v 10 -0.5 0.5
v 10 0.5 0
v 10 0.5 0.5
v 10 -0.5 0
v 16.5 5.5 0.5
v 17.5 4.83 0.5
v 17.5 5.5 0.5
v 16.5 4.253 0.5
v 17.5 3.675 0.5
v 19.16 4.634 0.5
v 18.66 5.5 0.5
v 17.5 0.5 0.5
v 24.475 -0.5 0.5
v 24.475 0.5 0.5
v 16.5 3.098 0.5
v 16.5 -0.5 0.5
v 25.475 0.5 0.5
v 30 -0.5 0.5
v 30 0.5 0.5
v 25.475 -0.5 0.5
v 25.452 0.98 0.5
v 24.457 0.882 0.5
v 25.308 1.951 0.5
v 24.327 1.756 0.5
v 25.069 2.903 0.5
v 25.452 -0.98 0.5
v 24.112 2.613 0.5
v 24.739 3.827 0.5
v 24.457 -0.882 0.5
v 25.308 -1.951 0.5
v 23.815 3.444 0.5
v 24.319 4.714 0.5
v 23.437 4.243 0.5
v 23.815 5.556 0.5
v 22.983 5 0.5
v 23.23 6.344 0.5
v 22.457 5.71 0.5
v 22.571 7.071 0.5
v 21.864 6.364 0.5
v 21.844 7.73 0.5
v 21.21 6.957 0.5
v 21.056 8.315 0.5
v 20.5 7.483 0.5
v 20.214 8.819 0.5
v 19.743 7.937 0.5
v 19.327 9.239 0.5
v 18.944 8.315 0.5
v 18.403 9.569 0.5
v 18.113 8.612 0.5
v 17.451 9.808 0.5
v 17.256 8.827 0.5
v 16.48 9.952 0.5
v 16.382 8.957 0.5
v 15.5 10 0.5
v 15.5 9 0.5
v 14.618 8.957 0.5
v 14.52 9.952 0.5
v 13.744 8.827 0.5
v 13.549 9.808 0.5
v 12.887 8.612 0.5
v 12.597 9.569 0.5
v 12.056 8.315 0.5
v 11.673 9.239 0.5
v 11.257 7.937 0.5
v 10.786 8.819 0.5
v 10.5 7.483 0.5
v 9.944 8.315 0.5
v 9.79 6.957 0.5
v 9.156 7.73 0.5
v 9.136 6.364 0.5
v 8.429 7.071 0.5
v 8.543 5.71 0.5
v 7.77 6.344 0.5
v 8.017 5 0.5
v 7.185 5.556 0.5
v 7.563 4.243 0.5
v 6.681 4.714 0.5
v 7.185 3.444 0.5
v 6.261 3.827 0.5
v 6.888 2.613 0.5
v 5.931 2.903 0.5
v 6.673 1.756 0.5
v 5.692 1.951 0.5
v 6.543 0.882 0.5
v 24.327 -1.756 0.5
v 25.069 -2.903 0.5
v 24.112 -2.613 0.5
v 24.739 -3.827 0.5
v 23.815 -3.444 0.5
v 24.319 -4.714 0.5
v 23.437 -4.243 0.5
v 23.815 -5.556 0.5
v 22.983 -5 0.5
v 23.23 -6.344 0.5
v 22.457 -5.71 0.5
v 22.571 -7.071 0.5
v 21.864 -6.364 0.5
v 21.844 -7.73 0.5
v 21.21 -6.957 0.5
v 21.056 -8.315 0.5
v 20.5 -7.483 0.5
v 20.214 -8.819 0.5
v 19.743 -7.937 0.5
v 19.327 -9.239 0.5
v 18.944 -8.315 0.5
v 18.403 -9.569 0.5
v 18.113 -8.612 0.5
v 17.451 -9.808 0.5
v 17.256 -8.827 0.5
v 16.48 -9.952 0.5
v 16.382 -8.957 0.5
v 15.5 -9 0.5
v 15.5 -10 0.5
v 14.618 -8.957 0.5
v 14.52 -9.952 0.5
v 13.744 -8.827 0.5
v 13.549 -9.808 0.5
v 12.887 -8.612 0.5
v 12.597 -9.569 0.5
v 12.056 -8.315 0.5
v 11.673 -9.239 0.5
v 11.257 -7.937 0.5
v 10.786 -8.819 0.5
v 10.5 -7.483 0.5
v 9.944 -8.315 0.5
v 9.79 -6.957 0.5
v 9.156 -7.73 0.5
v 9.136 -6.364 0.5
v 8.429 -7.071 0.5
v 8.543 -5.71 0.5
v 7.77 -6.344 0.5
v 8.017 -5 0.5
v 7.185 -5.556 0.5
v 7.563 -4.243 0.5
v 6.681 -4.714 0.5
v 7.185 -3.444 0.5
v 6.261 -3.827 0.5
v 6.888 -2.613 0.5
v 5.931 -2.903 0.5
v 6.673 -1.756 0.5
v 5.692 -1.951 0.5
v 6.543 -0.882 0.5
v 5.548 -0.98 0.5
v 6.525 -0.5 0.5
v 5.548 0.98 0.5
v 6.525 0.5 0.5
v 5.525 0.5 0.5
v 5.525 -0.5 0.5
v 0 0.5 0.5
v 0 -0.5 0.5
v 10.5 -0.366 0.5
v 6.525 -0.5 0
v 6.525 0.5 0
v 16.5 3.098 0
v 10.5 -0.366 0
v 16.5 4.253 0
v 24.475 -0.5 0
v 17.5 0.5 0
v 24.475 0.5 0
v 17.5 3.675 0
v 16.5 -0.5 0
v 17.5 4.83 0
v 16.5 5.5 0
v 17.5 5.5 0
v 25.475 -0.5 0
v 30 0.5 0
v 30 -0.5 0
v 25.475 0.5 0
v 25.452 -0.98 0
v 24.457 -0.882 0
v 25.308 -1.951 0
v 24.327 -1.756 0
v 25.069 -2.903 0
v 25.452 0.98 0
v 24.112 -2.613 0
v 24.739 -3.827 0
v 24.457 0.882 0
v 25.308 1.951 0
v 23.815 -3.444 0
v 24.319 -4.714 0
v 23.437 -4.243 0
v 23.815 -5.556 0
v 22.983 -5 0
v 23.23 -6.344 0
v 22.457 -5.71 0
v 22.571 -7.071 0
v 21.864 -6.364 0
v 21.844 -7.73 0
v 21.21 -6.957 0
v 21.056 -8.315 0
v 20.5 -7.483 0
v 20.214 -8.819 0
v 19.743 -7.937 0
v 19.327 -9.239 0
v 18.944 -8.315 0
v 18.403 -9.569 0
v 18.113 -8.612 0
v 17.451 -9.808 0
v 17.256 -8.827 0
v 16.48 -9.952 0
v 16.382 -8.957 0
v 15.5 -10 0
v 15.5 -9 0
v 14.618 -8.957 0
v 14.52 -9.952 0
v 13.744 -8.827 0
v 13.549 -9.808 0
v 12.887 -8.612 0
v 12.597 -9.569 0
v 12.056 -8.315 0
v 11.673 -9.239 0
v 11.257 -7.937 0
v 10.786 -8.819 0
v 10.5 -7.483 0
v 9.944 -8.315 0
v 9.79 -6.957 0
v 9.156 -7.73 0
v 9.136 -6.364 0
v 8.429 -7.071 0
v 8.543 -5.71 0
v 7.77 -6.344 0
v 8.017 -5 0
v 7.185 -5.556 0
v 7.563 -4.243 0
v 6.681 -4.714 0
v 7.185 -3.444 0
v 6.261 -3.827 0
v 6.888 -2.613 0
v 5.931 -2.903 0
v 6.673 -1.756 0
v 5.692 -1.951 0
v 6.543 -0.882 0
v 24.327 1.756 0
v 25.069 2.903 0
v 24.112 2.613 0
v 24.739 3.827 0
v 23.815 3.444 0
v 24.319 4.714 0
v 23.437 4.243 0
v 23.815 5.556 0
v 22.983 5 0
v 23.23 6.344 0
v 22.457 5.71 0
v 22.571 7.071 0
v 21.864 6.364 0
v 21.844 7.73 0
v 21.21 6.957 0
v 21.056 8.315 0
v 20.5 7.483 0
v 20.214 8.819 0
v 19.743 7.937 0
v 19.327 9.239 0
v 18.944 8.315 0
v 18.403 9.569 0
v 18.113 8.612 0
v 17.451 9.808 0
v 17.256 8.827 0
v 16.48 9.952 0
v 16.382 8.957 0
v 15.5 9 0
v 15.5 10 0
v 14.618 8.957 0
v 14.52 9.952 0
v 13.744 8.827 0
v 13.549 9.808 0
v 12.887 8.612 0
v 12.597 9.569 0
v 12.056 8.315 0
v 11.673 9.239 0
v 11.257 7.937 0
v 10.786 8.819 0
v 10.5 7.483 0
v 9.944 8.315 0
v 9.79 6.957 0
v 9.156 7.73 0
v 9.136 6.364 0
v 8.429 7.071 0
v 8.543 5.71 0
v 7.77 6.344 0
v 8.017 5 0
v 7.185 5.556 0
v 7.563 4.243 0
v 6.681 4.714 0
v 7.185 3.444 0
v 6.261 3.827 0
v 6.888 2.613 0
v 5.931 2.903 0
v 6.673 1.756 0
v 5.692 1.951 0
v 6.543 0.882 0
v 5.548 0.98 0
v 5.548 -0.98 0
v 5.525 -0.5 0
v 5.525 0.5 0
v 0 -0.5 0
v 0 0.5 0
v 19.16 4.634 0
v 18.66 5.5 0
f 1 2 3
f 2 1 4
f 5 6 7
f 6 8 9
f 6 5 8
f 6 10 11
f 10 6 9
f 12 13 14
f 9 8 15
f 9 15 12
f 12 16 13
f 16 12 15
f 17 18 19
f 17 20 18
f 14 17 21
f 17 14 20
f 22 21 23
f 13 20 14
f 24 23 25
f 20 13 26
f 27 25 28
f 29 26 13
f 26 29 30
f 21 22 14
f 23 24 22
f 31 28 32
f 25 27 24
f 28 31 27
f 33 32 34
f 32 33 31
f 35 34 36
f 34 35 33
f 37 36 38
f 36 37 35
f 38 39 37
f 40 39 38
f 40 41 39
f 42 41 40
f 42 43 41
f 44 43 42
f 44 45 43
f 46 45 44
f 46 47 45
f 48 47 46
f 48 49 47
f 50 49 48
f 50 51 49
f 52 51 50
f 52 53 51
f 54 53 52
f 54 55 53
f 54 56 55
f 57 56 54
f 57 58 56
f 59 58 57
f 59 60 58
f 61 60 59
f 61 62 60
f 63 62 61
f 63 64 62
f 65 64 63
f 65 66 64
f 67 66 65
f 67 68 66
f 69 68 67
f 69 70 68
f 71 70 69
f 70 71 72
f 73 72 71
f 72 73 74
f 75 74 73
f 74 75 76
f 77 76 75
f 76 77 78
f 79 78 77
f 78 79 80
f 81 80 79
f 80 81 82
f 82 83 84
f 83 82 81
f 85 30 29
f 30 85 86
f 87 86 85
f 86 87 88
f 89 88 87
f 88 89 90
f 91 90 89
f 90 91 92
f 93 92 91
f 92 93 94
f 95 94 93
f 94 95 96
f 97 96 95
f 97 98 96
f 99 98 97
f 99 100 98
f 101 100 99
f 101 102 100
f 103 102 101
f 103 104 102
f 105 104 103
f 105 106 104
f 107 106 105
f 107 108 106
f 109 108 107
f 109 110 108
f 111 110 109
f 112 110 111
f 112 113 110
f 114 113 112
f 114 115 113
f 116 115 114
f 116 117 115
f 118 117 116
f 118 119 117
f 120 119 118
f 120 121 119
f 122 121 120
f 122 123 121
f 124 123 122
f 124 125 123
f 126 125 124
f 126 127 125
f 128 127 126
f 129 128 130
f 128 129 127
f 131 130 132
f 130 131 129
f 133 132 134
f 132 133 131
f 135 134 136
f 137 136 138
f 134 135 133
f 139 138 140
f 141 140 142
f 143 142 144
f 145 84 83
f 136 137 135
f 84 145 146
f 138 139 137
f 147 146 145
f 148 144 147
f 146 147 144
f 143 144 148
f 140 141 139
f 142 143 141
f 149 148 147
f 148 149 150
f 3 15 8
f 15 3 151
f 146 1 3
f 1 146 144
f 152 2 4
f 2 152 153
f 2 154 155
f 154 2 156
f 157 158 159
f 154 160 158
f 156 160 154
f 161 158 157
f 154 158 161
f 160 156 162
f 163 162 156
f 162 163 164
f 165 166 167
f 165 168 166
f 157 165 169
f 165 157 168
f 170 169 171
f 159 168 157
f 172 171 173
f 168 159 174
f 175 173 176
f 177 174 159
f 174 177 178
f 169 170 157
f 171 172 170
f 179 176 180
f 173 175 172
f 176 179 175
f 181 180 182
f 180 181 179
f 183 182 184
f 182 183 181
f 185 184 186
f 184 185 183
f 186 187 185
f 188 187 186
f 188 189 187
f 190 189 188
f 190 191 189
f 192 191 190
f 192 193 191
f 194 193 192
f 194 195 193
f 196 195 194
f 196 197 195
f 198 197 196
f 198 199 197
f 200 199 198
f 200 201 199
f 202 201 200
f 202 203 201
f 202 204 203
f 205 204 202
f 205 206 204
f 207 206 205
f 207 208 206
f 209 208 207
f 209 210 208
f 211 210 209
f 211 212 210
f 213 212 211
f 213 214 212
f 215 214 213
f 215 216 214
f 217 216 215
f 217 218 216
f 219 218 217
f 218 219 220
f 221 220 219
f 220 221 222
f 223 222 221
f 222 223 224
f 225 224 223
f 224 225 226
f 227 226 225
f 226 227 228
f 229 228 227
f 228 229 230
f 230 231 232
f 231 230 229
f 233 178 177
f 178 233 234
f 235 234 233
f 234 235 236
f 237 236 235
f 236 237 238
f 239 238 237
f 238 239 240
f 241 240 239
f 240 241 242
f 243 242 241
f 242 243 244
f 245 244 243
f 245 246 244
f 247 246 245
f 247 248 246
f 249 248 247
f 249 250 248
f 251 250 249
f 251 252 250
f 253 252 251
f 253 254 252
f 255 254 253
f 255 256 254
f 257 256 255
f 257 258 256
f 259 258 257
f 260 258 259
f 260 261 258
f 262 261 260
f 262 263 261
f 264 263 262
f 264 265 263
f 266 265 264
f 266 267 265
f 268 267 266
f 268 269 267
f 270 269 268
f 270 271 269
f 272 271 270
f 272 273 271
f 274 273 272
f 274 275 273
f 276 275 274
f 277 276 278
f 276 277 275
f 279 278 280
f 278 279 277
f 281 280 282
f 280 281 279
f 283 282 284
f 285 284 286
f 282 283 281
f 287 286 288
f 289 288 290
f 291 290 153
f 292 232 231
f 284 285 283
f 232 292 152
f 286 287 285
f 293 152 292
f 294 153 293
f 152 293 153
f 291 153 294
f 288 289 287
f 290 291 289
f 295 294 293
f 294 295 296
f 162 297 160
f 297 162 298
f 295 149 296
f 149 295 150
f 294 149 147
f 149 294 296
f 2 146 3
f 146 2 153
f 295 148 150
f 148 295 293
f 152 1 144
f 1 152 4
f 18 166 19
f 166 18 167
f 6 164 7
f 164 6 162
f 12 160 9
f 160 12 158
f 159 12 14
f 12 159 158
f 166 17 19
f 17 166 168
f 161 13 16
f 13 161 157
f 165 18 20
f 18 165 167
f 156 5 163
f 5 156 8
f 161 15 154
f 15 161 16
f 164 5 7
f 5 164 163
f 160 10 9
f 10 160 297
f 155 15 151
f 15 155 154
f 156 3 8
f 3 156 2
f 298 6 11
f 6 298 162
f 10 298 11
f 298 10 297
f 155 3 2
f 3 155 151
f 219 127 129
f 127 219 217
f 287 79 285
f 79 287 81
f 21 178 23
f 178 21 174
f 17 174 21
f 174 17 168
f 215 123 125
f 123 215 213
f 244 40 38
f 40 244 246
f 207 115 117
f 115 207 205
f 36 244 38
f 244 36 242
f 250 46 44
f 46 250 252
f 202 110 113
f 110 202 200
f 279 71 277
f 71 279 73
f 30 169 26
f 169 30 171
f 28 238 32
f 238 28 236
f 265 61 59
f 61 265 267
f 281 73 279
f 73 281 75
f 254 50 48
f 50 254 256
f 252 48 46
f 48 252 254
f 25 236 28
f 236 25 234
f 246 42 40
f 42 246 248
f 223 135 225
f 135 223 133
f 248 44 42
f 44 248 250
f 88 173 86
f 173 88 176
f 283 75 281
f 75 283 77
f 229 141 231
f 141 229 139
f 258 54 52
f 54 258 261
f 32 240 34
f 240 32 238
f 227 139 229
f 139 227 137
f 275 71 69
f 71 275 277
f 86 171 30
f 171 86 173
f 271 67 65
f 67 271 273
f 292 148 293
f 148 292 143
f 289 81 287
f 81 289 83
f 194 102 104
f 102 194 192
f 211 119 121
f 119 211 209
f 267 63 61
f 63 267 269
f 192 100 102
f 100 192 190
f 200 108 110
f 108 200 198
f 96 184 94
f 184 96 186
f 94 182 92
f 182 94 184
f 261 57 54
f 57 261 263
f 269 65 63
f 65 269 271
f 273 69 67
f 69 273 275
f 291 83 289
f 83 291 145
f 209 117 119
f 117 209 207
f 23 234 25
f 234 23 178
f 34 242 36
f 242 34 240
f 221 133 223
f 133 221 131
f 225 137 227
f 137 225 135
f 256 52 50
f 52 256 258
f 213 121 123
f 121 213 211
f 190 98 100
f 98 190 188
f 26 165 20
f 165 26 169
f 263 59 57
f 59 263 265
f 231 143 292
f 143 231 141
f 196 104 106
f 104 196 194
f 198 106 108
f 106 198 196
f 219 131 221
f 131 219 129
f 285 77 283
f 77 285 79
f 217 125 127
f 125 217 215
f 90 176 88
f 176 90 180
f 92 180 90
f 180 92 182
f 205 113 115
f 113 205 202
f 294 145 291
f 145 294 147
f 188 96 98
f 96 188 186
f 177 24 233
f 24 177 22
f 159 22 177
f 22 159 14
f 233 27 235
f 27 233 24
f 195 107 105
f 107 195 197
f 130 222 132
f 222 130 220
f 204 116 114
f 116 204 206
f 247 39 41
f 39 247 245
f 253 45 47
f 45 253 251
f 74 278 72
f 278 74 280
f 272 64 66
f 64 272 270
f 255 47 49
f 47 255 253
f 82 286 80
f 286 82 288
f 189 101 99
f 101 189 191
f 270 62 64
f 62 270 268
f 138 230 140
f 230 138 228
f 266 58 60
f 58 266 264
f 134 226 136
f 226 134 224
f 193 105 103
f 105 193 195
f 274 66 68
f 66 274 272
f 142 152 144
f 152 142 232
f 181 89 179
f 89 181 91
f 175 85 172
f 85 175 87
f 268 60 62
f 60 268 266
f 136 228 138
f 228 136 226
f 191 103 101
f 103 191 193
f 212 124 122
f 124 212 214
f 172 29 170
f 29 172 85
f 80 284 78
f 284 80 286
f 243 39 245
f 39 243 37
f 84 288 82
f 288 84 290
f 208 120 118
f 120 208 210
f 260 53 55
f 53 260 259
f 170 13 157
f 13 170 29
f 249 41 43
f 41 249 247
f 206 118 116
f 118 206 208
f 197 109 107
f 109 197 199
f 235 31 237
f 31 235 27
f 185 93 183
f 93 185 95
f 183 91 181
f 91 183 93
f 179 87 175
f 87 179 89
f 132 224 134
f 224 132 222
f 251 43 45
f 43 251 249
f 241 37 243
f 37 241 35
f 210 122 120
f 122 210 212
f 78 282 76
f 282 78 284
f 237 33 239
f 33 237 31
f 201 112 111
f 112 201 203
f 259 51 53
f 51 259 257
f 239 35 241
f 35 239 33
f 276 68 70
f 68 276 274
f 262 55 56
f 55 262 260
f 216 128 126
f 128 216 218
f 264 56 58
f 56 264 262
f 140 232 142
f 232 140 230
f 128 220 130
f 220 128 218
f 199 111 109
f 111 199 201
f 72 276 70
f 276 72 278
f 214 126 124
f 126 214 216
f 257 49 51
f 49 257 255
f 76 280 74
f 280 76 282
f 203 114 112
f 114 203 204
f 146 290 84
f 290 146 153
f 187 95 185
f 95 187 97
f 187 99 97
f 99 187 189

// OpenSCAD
// file: sym_switch_nc.scad
// nc = normally closed
module switch_nc(length, width, thickness, height)
{
    translate([0,-thickness/2,0])cube([length/2-width/2, thickness, height]);
    
    translate([(length/2+width/4),-thickness/2,0])cube([(length/2-width/4), thickness, height]);
    
    translate([(length/2+width/4-thickness),-thickness/2,0])cube([thickness, 3*width/5, height]);
    
    translate([(length/2-width/2),+thickness/2, 0])rotate([0,0,-60])cube([thickness, width, height]);
    
}

switch_nc(30, 12, 1, 1);
// main file
use <sym_switch_nc.scad>

// nc = normally closed
module switch_reed_nc(length, width, thickness, height)
{
    switch_nc(length, width, thickness, height);
    radius = width;
    translate([2*length/4+thickness/2,0,0]) difference()
    {
        cylinder(r=radius, h=height, $fn=64);
        translate([0,0,-thickness/2])cylinder(r=(radius-thickness), h=(height+thickness), $fn=64);
    }
}

switch_reed_nc(30, 10, 1, 0.5);
